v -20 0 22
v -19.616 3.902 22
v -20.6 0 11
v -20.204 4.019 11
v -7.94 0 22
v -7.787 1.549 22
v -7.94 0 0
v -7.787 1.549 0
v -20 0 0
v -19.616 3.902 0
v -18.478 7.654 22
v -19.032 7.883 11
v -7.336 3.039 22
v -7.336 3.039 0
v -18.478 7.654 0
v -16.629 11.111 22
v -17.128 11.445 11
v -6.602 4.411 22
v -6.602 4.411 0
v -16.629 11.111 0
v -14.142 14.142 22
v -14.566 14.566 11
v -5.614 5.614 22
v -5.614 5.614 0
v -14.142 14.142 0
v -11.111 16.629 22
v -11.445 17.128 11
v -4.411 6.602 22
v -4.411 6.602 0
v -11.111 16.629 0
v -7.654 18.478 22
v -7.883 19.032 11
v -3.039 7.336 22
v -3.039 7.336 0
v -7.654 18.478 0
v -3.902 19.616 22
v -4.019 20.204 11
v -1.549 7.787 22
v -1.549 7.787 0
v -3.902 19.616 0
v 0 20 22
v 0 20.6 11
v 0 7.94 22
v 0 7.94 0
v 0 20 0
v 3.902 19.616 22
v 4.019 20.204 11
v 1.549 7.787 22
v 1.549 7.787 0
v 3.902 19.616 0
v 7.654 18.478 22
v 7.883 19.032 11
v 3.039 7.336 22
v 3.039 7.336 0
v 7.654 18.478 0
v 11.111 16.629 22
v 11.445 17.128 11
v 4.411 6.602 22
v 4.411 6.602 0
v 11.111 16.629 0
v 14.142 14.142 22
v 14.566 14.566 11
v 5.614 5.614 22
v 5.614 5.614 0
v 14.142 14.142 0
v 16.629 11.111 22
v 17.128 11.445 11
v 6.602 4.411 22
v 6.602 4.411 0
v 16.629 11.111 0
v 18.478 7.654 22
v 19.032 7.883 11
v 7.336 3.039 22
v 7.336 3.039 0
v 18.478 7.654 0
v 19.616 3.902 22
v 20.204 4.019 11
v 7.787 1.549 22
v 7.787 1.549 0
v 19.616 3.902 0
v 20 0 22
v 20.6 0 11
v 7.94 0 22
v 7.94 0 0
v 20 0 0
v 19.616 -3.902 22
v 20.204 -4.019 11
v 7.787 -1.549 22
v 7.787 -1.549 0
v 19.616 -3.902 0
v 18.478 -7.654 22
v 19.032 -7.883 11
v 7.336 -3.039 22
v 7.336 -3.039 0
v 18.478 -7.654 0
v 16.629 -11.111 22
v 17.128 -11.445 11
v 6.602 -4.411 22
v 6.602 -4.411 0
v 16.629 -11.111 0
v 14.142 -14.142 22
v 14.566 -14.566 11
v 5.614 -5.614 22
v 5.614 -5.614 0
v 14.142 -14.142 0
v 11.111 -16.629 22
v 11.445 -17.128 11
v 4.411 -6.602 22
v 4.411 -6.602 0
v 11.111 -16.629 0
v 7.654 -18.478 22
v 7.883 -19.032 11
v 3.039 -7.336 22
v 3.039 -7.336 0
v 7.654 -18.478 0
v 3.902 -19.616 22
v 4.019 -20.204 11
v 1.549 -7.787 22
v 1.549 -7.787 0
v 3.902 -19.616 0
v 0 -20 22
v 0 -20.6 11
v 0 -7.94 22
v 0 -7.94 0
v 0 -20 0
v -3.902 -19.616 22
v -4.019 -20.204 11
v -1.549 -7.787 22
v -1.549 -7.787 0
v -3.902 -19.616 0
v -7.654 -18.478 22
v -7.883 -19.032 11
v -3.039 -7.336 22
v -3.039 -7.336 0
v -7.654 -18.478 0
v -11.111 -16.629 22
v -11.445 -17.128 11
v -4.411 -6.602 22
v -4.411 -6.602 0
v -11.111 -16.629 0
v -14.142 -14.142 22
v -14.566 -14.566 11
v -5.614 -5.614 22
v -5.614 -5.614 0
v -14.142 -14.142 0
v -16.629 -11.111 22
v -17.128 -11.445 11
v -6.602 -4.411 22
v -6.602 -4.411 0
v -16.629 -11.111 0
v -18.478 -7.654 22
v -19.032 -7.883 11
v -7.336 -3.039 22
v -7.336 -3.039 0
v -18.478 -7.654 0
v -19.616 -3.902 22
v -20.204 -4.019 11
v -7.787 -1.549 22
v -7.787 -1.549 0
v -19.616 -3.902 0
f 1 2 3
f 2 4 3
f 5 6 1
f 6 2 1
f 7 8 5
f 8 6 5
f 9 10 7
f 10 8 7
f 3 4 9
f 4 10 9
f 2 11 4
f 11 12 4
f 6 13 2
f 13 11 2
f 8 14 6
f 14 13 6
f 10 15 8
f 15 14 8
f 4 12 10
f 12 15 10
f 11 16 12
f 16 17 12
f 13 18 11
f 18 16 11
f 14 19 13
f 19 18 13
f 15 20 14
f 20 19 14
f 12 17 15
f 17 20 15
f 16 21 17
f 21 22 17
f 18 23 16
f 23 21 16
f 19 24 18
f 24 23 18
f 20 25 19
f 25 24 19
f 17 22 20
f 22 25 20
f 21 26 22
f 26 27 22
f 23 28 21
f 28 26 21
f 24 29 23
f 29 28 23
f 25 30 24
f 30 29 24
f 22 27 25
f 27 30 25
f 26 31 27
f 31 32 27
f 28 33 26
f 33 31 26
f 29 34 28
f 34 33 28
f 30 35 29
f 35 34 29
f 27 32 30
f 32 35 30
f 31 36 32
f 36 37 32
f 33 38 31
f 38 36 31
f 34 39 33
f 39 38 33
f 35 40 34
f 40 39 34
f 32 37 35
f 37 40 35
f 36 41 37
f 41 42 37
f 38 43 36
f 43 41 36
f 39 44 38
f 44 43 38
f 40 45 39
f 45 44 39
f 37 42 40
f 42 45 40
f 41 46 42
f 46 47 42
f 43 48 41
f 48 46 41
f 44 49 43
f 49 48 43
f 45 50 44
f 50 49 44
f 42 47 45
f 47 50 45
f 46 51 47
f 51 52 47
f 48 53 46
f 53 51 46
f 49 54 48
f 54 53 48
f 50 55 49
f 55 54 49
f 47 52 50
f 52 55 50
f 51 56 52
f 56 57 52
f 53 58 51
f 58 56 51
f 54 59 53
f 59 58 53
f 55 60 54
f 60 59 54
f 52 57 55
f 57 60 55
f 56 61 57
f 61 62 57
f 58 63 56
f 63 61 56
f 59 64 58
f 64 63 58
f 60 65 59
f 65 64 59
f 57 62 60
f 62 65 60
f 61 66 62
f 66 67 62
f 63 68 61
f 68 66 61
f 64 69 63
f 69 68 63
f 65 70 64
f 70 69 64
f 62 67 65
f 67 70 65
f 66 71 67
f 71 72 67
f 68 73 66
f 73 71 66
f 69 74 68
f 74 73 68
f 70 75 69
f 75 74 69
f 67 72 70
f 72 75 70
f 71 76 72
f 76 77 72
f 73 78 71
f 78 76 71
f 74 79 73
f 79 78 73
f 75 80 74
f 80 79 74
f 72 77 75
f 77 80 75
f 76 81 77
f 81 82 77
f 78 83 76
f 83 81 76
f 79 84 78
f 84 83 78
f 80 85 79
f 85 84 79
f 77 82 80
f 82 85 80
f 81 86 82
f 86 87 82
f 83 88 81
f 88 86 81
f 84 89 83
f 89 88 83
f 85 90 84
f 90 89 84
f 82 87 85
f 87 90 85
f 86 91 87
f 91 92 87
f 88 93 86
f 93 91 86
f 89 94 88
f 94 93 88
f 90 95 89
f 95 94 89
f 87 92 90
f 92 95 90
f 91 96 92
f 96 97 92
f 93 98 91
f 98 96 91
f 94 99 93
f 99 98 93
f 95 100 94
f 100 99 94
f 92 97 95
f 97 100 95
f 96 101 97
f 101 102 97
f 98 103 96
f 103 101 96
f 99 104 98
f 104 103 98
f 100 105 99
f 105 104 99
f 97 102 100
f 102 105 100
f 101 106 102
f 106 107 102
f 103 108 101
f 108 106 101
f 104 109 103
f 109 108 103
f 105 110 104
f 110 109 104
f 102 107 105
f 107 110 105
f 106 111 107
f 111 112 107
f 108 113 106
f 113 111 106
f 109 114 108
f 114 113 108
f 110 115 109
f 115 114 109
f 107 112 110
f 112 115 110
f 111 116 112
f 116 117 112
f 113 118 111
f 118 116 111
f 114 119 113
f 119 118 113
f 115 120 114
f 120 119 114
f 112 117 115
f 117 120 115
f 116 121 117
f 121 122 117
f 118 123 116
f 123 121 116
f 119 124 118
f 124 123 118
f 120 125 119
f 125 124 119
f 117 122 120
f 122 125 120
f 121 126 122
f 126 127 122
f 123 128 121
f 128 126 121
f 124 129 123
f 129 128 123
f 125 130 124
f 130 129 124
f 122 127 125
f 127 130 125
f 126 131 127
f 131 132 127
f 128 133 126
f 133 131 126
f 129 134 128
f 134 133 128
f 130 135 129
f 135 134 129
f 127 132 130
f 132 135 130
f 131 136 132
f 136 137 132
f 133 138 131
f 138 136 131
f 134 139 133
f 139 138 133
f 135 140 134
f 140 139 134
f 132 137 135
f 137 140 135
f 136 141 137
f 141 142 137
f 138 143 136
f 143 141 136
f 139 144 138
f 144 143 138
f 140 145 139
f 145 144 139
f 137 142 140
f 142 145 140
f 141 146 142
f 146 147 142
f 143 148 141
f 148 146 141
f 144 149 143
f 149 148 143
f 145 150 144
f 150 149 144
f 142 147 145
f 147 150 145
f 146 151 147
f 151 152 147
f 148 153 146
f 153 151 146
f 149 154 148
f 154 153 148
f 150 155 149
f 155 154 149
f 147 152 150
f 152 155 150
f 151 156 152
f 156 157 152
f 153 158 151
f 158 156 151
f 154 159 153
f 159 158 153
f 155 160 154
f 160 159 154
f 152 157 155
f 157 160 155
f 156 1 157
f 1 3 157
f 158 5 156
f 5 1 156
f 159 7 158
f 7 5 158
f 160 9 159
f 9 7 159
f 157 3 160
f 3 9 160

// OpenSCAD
$fn = 32;

// ----------------------------------------------------------------------
// Belt roller: 40 mm barrel, 22 mm wide, bore 15.88 mm
// ----------------------------------------------------------------------

// --- parameters (mm) ---
bore_d = 15.88;           // bore
barrel_d = 40;            // barrel diameter
roller_w = 22;            // roller width
crown = 0.6;              // crown height at mid width

roller_profile = [[7.94, 0], [20, 0], [20.6, 11], [20, 22], [7.94, 22]];

/* the profile stays clear of the axis, so the bore comes out of the revolve */
rotate_extrude() polygon(roller_profile);
